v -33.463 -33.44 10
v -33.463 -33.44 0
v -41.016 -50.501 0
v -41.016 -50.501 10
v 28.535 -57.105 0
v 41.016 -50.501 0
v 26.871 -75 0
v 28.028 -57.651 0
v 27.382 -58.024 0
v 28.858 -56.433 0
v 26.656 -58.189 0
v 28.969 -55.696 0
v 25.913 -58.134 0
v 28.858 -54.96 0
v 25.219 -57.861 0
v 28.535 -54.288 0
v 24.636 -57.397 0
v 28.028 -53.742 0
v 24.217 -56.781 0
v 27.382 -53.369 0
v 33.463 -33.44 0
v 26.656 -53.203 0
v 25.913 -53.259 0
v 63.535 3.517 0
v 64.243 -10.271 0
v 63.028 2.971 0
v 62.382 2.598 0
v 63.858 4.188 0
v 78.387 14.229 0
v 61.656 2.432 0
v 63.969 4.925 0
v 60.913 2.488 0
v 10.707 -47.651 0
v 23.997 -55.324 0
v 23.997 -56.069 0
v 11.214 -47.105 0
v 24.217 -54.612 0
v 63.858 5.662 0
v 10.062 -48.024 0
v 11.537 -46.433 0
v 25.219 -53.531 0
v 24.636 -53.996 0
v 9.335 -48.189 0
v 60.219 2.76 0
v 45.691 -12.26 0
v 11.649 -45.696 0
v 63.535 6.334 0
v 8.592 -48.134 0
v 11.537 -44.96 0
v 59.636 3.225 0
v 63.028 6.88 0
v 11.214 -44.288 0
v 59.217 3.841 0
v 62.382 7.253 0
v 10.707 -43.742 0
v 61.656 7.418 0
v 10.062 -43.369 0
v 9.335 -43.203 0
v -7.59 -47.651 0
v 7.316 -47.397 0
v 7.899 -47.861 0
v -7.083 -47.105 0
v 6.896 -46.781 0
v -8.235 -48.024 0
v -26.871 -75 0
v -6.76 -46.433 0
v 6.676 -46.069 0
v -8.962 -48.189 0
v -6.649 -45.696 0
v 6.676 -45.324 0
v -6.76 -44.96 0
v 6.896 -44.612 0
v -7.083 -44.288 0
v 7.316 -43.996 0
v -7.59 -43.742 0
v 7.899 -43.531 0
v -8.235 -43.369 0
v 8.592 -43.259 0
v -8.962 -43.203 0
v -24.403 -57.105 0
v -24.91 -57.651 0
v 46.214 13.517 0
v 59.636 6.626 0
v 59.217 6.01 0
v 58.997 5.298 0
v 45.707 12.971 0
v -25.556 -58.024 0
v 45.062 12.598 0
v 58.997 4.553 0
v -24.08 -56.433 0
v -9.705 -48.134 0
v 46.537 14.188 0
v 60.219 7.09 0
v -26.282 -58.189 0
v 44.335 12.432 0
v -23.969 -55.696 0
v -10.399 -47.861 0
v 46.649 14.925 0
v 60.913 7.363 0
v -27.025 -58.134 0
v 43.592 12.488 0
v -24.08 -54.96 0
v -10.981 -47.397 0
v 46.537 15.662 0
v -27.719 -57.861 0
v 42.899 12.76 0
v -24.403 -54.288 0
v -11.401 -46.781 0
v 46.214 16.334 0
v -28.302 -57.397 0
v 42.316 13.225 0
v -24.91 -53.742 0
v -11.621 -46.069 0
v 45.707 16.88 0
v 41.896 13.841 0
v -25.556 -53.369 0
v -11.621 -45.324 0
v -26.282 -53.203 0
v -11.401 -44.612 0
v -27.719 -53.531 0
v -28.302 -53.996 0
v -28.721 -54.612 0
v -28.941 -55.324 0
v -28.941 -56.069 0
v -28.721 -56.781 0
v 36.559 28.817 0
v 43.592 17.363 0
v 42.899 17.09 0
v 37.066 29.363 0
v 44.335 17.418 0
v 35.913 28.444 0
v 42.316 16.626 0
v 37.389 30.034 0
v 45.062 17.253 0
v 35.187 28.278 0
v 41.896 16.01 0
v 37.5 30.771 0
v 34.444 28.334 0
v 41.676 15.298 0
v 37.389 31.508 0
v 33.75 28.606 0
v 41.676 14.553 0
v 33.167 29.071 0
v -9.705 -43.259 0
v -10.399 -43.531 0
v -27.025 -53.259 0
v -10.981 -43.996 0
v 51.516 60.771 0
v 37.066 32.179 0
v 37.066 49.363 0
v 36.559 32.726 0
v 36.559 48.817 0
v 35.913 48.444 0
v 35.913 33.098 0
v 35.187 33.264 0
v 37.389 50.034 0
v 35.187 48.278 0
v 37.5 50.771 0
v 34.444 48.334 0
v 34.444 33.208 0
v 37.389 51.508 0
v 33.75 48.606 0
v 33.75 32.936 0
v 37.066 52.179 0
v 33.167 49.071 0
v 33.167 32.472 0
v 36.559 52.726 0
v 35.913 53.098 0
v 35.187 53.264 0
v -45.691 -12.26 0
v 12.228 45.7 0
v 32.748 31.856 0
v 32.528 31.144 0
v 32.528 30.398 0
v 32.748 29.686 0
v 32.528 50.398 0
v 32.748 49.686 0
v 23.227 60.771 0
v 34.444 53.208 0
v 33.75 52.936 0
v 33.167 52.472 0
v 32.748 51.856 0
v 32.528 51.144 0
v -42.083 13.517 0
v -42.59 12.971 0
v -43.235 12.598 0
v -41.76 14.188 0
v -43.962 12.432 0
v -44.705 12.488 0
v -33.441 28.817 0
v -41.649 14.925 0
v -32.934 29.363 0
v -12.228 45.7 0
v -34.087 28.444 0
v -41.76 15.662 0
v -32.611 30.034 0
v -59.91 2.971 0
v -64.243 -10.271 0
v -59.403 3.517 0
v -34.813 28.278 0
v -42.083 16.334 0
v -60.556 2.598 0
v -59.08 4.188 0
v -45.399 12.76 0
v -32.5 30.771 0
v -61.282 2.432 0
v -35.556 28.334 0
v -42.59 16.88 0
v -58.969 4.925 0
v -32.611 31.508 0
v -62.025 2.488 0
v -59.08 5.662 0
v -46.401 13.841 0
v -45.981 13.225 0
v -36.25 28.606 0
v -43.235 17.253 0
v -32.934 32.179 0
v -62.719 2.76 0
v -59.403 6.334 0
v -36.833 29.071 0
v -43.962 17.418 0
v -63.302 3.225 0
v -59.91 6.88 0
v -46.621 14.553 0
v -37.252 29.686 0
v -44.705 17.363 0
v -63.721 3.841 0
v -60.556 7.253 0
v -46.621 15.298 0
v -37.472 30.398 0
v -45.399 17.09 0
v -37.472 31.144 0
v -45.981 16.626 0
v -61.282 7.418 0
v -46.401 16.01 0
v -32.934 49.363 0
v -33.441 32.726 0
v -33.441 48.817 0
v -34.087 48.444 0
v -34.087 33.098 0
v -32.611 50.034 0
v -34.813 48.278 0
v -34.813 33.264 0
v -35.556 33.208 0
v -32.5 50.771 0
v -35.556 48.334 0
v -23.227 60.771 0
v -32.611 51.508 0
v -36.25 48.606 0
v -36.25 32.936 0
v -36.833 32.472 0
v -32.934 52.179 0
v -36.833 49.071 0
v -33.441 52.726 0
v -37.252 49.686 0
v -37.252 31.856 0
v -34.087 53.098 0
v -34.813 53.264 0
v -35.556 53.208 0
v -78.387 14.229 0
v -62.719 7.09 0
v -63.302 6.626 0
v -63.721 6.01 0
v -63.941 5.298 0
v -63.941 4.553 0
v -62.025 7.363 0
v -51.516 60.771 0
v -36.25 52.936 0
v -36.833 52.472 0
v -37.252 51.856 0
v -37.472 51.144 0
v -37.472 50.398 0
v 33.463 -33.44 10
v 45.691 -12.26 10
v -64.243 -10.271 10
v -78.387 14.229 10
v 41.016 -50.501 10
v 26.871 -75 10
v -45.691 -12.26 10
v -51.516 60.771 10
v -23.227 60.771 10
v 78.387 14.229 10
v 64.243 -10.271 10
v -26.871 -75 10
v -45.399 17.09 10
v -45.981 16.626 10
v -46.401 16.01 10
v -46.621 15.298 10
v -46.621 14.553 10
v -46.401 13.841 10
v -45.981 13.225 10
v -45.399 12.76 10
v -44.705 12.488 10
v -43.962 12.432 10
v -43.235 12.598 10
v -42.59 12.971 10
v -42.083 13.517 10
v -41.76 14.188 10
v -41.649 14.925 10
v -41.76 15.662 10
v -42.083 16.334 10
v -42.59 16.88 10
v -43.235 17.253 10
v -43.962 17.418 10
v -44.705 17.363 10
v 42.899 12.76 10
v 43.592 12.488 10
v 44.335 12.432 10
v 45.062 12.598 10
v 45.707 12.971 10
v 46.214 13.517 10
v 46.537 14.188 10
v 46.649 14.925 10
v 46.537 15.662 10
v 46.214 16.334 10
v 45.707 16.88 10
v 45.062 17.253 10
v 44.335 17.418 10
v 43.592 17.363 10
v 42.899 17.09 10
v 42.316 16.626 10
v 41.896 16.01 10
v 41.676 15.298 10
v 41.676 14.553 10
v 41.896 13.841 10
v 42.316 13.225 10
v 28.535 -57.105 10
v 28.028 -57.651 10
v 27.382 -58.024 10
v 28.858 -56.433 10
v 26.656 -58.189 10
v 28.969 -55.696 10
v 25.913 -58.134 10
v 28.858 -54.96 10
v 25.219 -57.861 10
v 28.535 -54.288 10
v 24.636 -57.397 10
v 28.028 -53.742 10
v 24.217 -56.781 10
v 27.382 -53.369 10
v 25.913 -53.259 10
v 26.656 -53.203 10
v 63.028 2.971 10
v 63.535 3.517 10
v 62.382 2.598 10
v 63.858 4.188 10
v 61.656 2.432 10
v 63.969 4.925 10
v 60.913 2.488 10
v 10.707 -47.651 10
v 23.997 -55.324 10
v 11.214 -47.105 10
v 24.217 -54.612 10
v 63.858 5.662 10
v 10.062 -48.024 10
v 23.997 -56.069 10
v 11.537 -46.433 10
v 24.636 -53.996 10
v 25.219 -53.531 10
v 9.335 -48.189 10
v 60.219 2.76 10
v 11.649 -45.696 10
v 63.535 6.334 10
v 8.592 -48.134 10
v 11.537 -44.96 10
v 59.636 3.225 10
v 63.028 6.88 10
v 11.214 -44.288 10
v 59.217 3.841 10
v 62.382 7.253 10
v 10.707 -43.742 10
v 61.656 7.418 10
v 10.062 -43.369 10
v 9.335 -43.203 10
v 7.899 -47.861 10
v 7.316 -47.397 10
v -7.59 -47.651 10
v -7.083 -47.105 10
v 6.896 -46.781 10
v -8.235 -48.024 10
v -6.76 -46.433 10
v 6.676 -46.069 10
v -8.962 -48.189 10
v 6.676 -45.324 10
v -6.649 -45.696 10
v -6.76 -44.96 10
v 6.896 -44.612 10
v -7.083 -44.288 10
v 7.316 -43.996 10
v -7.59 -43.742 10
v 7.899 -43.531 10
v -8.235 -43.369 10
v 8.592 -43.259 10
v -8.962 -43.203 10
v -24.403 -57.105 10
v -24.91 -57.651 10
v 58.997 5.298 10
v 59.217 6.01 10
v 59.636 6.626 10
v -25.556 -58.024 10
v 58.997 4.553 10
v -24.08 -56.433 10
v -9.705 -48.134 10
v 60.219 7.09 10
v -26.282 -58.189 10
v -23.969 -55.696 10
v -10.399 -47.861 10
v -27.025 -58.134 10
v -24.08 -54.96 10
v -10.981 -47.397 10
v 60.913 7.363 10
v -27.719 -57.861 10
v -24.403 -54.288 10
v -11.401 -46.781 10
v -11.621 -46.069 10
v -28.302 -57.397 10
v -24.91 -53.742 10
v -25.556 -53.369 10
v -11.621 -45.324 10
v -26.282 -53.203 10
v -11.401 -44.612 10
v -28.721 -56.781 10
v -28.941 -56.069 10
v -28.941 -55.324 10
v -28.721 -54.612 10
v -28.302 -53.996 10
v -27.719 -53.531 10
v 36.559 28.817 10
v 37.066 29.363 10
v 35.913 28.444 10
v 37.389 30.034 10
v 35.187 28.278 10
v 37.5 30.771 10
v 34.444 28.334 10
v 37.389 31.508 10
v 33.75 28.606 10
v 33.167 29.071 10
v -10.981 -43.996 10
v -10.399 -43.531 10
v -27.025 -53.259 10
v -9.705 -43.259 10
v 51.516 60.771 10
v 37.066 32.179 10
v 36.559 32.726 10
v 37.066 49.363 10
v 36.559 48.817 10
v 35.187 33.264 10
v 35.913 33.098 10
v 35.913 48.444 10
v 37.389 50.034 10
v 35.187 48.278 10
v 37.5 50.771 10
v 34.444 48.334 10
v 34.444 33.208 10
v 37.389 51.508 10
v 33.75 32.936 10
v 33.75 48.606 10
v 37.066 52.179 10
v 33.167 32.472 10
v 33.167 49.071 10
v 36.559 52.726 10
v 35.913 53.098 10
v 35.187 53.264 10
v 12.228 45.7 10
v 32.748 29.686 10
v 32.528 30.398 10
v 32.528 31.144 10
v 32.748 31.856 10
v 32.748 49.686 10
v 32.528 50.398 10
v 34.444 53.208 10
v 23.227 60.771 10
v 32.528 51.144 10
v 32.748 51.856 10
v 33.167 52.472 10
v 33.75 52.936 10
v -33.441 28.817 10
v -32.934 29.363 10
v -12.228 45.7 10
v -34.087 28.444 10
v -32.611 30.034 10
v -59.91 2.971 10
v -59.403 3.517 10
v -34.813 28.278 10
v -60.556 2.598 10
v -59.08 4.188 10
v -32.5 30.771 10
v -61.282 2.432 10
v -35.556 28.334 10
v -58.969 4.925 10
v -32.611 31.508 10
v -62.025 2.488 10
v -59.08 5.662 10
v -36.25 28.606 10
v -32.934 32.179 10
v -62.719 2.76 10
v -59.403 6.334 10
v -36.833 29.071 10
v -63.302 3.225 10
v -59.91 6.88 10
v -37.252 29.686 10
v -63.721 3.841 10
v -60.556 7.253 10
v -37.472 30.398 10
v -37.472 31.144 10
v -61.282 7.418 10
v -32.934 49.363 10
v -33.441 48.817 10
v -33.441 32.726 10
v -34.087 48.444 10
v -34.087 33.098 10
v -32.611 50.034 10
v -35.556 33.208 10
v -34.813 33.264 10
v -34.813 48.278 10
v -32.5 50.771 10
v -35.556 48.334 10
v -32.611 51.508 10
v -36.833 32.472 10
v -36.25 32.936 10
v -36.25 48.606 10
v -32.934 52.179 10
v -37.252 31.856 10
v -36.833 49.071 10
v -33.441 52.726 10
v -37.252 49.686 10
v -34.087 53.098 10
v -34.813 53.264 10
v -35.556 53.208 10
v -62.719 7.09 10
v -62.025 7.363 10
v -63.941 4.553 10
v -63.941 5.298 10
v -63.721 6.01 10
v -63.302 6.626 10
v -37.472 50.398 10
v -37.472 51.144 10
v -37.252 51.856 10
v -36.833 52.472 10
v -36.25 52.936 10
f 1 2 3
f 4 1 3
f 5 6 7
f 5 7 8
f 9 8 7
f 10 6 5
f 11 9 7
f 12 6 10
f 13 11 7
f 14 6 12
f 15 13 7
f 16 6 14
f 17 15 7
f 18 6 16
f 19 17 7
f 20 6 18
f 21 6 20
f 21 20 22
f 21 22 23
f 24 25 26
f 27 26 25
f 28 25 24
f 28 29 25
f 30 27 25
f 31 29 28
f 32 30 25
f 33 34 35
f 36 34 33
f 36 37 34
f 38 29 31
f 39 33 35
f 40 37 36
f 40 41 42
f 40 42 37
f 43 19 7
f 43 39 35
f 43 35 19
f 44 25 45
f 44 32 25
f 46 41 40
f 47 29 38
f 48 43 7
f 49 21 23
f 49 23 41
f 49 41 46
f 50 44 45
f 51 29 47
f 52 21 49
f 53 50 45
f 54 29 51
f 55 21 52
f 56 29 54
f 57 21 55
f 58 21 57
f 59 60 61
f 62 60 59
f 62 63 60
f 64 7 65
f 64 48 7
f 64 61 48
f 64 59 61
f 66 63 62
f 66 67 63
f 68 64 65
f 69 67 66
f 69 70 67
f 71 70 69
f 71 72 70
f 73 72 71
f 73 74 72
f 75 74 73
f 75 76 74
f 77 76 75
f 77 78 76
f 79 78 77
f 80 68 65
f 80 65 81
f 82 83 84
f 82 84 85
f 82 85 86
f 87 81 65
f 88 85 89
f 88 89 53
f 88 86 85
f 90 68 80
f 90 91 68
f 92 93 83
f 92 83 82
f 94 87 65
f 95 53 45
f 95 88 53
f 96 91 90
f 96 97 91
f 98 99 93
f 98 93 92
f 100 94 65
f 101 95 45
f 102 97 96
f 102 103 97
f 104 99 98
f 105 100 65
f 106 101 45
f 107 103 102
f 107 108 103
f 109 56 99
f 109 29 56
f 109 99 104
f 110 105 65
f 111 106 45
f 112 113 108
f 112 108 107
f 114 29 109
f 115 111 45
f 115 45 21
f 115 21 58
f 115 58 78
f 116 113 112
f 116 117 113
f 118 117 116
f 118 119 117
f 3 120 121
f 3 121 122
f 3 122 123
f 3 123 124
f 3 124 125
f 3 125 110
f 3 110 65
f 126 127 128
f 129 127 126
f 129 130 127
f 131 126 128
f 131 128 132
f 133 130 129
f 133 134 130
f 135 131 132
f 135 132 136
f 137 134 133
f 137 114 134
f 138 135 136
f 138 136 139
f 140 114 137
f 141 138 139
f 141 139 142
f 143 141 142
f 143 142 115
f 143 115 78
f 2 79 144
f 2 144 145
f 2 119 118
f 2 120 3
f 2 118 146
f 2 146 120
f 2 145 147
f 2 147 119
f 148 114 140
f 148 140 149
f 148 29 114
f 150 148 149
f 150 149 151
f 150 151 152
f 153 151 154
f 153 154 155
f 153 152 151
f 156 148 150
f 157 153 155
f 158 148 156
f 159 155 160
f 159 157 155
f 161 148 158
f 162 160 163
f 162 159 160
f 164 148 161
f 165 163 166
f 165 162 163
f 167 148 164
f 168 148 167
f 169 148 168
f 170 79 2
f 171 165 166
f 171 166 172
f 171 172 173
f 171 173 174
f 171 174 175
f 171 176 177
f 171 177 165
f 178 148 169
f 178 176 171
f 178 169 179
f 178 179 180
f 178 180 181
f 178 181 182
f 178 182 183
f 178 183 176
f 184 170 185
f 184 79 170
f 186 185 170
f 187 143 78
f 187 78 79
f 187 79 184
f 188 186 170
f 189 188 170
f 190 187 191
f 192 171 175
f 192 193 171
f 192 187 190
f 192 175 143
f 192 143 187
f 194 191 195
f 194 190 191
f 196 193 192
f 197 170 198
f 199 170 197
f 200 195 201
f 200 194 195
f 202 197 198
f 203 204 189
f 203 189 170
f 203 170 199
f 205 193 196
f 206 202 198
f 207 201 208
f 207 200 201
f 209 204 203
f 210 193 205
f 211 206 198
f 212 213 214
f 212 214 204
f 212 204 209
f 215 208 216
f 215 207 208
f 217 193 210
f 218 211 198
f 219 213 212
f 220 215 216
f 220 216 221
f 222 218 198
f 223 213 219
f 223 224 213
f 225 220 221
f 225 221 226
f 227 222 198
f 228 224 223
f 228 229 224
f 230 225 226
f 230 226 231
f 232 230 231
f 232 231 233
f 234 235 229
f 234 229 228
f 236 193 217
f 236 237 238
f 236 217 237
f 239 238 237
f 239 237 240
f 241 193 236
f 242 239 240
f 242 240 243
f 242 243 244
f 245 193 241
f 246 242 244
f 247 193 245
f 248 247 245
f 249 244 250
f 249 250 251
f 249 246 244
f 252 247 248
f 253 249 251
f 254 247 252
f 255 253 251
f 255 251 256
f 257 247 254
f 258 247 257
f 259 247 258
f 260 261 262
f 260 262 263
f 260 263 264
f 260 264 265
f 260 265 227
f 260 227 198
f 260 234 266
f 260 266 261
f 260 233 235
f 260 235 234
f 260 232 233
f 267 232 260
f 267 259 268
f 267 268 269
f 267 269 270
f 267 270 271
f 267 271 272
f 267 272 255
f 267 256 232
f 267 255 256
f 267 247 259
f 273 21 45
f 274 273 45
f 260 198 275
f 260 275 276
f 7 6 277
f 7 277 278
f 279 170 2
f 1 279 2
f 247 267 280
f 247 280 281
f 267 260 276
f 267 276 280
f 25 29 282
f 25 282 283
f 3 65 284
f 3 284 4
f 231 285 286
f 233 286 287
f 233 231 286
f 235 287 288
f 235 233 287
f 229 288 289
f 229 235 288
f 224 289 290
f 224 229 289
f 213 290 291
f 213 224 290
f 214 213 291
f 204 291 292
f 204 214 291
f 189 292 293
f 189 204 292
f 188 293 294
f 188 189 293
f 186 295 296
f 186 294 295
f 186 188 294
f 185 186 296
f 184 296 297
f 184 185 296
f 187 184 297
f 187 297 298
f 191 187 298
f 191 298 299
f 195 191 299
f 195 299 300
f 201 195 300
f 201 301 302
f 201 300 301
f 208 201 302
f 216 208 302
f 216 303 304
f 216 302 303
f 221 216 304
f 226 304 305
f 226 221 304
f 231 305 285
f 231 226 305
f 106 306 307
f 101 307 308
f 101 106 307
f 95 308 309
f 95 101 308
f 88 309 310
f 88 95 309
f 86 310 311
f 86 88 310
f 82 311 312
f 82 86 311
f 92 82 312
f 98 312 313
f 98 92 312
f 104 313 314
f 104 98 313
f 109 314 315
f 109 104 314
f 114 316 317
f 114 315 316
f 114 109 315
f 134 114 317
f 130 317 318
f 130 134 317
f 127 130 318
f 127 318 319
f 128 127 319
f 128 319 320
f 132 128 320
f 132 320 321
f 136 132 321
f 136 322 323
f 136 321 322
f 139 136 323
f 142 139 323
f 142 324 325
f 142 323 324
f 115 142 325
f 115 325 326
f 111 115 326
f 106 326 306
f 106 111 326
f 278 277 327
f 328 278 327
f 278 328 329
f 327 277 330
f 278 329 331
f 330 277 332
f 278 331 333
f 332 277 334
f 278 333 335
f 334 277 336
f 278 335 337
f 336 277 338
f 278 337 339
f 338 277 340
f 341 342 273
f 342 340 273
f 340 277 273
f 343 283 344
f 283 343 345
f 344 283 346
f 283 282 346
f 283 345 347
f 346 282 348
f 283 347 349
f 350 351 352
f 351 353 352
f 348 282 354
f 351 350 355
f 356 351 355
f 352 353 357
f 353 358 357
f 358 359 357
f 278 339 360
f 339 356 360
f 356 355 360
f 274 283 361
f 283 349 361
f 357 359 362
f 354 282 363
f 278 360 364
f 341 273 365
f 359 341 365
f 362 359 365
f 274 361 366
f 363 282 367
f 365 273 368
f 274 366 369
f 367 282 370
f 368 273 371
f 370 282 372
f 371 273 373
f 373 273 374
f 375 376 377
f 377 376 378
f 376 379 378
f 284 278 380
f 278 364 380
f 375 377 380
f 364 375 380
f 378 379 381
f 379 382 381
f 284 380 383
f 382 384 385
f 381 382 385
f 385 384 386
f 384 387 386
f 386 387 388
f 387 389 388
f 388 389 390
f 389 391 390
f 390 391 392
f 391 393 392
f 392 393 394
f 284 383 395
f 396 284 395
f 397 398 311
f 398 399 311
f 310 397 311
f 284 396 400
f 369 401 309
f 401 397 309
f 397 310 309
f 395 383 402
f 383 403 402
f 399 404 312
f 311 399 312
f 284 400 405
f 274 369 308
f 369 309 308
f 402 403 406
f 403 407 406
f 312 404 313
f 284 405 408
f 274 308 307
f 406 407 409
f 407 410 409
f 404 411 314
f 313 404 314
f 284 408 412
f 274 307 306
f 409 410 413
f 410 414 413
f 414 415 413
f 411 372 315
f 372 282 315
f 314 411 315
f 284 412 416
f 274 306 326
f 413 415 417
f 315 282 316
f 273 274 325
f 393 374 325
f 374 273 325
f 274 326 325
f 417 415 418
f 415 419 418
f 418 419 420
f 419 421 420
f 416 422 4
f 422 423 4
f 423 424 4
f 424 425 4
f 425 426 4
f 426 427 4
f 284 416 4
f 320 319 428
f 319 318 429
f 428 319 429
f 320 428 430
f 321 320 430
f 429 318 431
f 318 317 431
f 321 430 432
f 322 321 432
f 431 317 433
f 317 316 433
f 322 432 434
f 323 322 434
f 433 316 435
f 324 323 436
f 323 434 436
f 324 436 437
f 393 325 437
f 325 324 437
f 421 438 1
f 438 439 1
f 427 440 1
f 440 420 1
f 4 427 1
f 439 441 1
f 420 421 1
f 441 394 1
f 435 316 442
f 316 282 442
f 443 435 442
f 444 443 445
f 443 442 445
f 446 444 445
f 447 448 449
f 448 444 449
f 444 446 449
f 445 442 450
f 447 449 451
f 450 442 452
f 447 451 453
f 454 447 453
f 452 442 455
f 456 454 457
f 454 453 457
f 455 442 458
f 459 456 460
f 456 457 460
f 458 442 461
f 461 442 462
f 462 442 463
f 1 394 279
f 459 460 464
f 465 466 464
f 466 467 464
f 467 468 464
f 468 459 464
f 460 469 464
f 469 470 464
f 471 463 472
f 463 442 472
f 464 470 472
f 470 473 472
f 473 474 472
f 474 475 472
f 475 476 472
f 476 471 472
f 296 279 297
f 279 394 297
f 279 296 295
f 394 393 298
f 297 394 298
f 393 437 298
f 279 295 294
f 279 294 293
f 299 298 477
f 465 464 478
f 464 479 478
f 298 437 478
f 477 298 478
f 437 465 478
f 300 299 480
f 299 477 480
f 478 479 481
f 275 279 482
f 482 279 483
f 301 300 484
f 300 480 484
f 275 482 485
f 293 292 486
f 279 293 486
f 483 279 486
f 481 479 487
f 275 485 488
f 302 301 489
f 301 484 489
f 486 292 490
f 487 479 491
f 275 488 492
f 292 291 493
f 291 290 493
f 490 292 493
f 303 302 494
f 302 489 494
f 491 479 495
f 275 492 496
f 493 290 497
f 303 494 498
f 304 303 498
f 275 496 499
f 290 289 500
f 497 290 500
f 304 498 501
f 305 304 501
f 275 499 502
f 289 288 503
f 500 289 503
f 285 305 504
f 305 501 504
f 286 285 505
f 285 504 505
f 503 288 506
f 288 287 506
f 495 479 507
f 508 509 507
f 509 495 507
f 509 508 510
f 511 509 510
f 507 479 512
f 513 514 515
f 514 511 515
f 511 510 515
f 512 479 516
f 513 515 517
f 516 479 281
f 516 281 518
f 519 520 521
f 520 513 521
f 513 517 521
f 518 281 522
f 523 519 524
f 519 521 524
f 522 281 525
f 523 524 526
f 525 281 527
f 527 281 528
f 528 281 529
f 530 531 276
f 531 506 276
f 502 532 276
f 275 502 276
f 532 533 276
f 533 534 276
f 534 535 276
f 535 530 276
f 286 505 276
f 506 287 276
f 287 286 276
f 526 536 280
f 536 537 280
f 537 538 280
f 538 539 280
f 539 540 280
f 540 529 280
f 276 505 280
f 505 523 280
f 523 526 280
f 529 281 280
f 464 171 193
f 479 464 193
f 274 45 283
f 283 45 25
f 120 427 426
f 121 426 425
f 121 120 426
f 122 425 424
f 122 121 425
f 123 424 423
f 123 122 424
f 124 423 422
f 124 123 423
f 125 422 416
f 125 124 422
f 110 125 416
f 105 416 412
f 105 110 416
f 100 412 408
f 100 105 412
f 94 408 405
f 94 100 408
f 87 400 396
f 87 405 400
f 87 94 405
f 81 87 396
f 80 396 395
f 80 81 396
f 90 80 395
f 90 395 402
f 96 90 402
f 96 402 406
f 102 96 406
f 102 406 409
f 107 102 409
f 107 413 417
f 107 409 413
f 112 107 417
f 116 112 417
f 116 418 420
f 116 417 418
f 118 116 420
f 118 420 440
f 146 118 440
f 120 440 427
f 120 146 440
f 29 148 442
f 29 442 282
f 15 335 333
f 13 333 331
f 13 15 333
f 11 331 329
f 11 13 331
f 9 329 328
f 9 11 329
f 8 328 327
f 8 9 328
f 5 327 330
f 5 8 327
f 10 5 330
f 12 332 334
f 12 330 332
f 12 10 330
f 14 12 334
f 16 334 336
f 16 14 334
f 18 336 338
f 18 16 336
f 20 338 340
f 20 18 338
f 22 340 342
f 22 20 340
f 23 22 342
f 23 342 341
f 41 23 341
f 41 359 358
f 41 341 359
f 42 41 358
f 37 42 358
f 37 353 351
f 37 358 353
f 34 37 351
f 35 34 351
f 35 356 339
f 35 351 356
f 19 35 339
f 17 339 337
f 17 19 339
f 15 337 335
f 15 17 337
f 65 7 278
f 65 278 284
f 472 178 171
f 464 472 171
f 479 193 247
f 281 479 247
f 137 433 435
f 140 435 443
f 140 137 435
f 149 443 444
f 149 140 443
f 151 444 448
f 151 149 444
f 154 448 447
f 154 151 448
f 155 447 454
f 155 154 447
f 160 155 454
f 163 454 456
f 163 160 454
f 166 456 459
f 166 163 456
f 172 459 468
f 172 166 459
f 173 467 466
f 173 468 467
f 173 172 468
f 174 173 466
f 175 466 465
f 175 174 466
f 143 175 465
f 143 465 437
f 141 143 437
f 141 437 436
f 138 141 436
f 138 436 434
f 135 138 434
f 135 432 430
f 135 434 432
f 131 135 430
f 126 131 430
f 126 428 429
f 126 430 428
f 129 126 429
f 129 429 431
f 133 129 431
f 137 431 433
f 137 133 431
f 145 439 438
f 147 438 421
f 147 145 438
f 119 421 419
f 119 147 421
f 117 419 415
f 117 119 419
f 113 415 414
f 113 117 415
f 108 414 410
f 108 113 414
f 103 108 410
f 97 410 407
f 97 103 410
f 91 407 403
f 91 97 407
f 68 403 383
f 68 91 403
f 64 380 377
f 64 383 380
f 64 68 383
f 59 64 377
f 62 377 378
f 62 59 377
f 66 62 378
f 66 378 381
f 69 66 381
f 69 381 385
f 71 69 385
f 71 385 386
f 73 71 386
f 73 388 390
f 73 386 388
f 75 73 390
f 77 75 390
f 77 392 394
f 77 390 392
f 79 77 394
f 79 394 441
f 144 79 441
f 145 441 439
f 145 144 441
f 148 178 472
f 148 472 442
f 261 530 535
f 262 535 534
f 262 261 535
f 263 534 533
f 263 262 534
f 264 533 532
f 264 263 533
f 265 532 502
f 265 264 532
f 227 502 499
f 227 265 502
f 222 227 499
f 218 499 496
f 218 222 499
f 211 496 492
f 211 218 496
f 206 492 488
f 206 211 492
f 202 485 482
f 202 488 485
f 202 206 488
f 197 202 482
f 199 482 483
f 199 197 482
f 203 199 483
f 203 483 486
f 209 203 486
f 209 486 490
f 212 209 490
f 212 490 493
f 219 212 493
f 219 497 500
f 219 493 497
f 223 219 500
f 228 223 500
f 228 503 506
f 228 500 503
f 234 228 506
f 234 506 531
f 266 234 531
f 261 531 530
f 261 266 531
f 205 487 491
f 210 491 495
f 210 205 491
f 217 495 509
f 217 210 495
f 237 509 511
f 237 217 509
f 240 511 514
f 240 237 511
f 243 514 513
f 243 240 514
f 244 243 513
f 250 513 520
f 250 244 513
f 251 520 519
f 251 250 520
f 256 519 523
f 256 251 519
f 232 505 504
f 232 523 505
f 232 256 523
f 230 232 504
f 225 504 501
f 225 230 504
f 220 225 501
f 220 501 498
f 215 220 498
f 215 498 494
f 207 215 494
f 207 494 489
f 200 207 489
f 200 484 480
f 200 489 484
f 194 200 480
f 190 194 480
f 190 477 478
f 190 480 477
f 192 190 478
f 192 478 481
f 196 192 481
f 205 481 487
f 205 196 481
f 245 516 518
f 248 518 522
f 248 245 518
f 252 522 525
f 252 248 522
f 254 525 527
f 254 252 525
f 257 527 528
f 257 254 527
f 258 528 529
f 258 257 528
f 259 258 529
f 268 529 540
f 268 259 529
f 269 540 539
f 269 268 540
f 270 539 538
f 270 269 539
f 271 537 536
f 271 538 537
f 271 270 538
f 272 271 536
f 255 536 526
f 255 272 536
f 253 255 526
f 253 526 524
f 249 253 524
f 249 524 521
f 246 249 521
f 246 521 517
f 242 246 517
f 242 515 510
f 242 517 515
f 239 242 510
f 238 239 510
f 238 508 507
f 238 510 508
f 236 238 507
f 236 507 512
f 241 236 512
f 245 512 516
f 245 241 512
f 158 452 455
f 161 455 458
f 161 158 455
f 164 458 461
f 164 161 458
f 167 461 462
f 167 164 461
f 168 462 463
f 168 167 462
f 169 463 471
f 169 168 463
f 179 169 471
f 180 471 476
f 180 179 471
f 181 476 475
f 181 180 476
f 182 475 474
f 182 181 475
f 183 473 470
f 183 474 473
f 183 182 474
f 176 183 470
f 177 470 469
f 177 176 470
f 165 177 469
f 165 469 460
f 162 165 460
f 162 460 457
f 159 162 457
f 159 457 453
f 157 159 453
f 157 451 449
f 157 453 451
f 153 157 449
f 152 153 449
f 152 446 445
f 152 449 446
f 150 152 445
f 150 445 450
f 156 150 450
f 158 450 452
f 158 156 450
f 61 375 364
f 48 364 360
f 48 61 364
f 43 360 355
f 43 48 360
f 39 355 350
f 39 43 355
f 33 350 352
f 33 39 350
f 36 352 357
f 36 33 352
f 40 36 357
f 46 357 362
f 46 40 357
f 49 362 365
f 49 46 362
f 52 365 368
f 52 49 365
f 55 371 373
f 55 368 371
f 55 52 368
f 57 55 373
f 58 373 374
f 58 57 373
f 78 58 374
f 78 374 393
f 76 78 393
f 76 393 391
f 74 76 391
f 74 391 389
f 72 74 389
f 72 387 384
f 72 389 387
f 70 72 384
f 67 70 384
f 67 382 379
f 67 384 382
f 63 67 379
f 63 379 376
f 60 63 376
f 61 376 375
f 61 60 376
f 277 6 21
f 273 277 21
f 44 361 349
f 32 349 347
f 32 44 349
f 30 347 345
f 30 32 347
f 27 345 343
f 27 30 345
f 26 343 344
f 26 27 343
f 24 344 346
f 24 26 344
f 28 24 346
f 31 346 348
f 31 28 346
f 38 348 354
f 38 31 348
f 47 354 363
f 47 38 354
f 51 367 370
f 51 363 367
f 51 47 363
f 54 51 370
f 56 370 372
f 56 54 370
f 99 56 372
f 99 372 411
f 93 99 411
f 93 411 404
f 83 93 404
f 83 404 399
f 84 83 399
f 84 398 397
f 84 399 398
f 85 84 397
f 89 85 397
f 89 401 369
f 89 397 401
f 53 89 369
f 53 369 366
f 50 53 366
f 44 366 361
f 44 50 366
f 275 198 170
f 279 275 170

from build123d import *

# Parameters (mm, degrees)
PAD007_DEPTH       = 10
SKETCH012_R        = 2.5
POCKET003_DEPTH    = 425.270426
POLARPATTERN_COUNT = 3


with BuildPart() as part:
    # Sketch011 → Pad007 (new body)
    with BuildSketch(Plane.XY):
        Polygon((-51.516335, 60.77109), (51.516335, 60.77109), (78.387475, 14.22891), (26.87114, -75), (-26.87114, -75), (-78.387475, 14.22891), align=None)
    extrude(amount=PAD007_DEPTH)

    # Sketch012 → Pocket003 (cut, through all)
    with BuildSketch(Plane.XY):
        with Locations((-35, 50.77109)):
            Circle(SKETCH012_R)
        with Locations((35, 50.77109)):
            Circle(SKETCH012_R)
        with Locations((-35, 30.77109)):
            Circle(SKETCH012_R)
        with Locations((35, 30.77109)):
            Circle(SKETCH012_R)
        Polygon((23.226799, 60.77109), (12.228239, 45.7), (-12.228239, 45.7), (-23.226799, 60.77109), align=None)
    pocket003 = extrude(amount=POCKET003_DEPTH, mode=Mode.SUBTRACT)

    # PolarPattern: Pocket003 ×3 about axis
    polarpattern_axis = Axis((0, 0, 0), (0, 0, 1))
    for i in range(1, POLARPATTERN_COUNT):
        add(pocket003.rotate(polarpattern_axis, i * 360 / POLARPATTERN_COUNT), mode=Mode.SUBTRACT)


solid = part.part
